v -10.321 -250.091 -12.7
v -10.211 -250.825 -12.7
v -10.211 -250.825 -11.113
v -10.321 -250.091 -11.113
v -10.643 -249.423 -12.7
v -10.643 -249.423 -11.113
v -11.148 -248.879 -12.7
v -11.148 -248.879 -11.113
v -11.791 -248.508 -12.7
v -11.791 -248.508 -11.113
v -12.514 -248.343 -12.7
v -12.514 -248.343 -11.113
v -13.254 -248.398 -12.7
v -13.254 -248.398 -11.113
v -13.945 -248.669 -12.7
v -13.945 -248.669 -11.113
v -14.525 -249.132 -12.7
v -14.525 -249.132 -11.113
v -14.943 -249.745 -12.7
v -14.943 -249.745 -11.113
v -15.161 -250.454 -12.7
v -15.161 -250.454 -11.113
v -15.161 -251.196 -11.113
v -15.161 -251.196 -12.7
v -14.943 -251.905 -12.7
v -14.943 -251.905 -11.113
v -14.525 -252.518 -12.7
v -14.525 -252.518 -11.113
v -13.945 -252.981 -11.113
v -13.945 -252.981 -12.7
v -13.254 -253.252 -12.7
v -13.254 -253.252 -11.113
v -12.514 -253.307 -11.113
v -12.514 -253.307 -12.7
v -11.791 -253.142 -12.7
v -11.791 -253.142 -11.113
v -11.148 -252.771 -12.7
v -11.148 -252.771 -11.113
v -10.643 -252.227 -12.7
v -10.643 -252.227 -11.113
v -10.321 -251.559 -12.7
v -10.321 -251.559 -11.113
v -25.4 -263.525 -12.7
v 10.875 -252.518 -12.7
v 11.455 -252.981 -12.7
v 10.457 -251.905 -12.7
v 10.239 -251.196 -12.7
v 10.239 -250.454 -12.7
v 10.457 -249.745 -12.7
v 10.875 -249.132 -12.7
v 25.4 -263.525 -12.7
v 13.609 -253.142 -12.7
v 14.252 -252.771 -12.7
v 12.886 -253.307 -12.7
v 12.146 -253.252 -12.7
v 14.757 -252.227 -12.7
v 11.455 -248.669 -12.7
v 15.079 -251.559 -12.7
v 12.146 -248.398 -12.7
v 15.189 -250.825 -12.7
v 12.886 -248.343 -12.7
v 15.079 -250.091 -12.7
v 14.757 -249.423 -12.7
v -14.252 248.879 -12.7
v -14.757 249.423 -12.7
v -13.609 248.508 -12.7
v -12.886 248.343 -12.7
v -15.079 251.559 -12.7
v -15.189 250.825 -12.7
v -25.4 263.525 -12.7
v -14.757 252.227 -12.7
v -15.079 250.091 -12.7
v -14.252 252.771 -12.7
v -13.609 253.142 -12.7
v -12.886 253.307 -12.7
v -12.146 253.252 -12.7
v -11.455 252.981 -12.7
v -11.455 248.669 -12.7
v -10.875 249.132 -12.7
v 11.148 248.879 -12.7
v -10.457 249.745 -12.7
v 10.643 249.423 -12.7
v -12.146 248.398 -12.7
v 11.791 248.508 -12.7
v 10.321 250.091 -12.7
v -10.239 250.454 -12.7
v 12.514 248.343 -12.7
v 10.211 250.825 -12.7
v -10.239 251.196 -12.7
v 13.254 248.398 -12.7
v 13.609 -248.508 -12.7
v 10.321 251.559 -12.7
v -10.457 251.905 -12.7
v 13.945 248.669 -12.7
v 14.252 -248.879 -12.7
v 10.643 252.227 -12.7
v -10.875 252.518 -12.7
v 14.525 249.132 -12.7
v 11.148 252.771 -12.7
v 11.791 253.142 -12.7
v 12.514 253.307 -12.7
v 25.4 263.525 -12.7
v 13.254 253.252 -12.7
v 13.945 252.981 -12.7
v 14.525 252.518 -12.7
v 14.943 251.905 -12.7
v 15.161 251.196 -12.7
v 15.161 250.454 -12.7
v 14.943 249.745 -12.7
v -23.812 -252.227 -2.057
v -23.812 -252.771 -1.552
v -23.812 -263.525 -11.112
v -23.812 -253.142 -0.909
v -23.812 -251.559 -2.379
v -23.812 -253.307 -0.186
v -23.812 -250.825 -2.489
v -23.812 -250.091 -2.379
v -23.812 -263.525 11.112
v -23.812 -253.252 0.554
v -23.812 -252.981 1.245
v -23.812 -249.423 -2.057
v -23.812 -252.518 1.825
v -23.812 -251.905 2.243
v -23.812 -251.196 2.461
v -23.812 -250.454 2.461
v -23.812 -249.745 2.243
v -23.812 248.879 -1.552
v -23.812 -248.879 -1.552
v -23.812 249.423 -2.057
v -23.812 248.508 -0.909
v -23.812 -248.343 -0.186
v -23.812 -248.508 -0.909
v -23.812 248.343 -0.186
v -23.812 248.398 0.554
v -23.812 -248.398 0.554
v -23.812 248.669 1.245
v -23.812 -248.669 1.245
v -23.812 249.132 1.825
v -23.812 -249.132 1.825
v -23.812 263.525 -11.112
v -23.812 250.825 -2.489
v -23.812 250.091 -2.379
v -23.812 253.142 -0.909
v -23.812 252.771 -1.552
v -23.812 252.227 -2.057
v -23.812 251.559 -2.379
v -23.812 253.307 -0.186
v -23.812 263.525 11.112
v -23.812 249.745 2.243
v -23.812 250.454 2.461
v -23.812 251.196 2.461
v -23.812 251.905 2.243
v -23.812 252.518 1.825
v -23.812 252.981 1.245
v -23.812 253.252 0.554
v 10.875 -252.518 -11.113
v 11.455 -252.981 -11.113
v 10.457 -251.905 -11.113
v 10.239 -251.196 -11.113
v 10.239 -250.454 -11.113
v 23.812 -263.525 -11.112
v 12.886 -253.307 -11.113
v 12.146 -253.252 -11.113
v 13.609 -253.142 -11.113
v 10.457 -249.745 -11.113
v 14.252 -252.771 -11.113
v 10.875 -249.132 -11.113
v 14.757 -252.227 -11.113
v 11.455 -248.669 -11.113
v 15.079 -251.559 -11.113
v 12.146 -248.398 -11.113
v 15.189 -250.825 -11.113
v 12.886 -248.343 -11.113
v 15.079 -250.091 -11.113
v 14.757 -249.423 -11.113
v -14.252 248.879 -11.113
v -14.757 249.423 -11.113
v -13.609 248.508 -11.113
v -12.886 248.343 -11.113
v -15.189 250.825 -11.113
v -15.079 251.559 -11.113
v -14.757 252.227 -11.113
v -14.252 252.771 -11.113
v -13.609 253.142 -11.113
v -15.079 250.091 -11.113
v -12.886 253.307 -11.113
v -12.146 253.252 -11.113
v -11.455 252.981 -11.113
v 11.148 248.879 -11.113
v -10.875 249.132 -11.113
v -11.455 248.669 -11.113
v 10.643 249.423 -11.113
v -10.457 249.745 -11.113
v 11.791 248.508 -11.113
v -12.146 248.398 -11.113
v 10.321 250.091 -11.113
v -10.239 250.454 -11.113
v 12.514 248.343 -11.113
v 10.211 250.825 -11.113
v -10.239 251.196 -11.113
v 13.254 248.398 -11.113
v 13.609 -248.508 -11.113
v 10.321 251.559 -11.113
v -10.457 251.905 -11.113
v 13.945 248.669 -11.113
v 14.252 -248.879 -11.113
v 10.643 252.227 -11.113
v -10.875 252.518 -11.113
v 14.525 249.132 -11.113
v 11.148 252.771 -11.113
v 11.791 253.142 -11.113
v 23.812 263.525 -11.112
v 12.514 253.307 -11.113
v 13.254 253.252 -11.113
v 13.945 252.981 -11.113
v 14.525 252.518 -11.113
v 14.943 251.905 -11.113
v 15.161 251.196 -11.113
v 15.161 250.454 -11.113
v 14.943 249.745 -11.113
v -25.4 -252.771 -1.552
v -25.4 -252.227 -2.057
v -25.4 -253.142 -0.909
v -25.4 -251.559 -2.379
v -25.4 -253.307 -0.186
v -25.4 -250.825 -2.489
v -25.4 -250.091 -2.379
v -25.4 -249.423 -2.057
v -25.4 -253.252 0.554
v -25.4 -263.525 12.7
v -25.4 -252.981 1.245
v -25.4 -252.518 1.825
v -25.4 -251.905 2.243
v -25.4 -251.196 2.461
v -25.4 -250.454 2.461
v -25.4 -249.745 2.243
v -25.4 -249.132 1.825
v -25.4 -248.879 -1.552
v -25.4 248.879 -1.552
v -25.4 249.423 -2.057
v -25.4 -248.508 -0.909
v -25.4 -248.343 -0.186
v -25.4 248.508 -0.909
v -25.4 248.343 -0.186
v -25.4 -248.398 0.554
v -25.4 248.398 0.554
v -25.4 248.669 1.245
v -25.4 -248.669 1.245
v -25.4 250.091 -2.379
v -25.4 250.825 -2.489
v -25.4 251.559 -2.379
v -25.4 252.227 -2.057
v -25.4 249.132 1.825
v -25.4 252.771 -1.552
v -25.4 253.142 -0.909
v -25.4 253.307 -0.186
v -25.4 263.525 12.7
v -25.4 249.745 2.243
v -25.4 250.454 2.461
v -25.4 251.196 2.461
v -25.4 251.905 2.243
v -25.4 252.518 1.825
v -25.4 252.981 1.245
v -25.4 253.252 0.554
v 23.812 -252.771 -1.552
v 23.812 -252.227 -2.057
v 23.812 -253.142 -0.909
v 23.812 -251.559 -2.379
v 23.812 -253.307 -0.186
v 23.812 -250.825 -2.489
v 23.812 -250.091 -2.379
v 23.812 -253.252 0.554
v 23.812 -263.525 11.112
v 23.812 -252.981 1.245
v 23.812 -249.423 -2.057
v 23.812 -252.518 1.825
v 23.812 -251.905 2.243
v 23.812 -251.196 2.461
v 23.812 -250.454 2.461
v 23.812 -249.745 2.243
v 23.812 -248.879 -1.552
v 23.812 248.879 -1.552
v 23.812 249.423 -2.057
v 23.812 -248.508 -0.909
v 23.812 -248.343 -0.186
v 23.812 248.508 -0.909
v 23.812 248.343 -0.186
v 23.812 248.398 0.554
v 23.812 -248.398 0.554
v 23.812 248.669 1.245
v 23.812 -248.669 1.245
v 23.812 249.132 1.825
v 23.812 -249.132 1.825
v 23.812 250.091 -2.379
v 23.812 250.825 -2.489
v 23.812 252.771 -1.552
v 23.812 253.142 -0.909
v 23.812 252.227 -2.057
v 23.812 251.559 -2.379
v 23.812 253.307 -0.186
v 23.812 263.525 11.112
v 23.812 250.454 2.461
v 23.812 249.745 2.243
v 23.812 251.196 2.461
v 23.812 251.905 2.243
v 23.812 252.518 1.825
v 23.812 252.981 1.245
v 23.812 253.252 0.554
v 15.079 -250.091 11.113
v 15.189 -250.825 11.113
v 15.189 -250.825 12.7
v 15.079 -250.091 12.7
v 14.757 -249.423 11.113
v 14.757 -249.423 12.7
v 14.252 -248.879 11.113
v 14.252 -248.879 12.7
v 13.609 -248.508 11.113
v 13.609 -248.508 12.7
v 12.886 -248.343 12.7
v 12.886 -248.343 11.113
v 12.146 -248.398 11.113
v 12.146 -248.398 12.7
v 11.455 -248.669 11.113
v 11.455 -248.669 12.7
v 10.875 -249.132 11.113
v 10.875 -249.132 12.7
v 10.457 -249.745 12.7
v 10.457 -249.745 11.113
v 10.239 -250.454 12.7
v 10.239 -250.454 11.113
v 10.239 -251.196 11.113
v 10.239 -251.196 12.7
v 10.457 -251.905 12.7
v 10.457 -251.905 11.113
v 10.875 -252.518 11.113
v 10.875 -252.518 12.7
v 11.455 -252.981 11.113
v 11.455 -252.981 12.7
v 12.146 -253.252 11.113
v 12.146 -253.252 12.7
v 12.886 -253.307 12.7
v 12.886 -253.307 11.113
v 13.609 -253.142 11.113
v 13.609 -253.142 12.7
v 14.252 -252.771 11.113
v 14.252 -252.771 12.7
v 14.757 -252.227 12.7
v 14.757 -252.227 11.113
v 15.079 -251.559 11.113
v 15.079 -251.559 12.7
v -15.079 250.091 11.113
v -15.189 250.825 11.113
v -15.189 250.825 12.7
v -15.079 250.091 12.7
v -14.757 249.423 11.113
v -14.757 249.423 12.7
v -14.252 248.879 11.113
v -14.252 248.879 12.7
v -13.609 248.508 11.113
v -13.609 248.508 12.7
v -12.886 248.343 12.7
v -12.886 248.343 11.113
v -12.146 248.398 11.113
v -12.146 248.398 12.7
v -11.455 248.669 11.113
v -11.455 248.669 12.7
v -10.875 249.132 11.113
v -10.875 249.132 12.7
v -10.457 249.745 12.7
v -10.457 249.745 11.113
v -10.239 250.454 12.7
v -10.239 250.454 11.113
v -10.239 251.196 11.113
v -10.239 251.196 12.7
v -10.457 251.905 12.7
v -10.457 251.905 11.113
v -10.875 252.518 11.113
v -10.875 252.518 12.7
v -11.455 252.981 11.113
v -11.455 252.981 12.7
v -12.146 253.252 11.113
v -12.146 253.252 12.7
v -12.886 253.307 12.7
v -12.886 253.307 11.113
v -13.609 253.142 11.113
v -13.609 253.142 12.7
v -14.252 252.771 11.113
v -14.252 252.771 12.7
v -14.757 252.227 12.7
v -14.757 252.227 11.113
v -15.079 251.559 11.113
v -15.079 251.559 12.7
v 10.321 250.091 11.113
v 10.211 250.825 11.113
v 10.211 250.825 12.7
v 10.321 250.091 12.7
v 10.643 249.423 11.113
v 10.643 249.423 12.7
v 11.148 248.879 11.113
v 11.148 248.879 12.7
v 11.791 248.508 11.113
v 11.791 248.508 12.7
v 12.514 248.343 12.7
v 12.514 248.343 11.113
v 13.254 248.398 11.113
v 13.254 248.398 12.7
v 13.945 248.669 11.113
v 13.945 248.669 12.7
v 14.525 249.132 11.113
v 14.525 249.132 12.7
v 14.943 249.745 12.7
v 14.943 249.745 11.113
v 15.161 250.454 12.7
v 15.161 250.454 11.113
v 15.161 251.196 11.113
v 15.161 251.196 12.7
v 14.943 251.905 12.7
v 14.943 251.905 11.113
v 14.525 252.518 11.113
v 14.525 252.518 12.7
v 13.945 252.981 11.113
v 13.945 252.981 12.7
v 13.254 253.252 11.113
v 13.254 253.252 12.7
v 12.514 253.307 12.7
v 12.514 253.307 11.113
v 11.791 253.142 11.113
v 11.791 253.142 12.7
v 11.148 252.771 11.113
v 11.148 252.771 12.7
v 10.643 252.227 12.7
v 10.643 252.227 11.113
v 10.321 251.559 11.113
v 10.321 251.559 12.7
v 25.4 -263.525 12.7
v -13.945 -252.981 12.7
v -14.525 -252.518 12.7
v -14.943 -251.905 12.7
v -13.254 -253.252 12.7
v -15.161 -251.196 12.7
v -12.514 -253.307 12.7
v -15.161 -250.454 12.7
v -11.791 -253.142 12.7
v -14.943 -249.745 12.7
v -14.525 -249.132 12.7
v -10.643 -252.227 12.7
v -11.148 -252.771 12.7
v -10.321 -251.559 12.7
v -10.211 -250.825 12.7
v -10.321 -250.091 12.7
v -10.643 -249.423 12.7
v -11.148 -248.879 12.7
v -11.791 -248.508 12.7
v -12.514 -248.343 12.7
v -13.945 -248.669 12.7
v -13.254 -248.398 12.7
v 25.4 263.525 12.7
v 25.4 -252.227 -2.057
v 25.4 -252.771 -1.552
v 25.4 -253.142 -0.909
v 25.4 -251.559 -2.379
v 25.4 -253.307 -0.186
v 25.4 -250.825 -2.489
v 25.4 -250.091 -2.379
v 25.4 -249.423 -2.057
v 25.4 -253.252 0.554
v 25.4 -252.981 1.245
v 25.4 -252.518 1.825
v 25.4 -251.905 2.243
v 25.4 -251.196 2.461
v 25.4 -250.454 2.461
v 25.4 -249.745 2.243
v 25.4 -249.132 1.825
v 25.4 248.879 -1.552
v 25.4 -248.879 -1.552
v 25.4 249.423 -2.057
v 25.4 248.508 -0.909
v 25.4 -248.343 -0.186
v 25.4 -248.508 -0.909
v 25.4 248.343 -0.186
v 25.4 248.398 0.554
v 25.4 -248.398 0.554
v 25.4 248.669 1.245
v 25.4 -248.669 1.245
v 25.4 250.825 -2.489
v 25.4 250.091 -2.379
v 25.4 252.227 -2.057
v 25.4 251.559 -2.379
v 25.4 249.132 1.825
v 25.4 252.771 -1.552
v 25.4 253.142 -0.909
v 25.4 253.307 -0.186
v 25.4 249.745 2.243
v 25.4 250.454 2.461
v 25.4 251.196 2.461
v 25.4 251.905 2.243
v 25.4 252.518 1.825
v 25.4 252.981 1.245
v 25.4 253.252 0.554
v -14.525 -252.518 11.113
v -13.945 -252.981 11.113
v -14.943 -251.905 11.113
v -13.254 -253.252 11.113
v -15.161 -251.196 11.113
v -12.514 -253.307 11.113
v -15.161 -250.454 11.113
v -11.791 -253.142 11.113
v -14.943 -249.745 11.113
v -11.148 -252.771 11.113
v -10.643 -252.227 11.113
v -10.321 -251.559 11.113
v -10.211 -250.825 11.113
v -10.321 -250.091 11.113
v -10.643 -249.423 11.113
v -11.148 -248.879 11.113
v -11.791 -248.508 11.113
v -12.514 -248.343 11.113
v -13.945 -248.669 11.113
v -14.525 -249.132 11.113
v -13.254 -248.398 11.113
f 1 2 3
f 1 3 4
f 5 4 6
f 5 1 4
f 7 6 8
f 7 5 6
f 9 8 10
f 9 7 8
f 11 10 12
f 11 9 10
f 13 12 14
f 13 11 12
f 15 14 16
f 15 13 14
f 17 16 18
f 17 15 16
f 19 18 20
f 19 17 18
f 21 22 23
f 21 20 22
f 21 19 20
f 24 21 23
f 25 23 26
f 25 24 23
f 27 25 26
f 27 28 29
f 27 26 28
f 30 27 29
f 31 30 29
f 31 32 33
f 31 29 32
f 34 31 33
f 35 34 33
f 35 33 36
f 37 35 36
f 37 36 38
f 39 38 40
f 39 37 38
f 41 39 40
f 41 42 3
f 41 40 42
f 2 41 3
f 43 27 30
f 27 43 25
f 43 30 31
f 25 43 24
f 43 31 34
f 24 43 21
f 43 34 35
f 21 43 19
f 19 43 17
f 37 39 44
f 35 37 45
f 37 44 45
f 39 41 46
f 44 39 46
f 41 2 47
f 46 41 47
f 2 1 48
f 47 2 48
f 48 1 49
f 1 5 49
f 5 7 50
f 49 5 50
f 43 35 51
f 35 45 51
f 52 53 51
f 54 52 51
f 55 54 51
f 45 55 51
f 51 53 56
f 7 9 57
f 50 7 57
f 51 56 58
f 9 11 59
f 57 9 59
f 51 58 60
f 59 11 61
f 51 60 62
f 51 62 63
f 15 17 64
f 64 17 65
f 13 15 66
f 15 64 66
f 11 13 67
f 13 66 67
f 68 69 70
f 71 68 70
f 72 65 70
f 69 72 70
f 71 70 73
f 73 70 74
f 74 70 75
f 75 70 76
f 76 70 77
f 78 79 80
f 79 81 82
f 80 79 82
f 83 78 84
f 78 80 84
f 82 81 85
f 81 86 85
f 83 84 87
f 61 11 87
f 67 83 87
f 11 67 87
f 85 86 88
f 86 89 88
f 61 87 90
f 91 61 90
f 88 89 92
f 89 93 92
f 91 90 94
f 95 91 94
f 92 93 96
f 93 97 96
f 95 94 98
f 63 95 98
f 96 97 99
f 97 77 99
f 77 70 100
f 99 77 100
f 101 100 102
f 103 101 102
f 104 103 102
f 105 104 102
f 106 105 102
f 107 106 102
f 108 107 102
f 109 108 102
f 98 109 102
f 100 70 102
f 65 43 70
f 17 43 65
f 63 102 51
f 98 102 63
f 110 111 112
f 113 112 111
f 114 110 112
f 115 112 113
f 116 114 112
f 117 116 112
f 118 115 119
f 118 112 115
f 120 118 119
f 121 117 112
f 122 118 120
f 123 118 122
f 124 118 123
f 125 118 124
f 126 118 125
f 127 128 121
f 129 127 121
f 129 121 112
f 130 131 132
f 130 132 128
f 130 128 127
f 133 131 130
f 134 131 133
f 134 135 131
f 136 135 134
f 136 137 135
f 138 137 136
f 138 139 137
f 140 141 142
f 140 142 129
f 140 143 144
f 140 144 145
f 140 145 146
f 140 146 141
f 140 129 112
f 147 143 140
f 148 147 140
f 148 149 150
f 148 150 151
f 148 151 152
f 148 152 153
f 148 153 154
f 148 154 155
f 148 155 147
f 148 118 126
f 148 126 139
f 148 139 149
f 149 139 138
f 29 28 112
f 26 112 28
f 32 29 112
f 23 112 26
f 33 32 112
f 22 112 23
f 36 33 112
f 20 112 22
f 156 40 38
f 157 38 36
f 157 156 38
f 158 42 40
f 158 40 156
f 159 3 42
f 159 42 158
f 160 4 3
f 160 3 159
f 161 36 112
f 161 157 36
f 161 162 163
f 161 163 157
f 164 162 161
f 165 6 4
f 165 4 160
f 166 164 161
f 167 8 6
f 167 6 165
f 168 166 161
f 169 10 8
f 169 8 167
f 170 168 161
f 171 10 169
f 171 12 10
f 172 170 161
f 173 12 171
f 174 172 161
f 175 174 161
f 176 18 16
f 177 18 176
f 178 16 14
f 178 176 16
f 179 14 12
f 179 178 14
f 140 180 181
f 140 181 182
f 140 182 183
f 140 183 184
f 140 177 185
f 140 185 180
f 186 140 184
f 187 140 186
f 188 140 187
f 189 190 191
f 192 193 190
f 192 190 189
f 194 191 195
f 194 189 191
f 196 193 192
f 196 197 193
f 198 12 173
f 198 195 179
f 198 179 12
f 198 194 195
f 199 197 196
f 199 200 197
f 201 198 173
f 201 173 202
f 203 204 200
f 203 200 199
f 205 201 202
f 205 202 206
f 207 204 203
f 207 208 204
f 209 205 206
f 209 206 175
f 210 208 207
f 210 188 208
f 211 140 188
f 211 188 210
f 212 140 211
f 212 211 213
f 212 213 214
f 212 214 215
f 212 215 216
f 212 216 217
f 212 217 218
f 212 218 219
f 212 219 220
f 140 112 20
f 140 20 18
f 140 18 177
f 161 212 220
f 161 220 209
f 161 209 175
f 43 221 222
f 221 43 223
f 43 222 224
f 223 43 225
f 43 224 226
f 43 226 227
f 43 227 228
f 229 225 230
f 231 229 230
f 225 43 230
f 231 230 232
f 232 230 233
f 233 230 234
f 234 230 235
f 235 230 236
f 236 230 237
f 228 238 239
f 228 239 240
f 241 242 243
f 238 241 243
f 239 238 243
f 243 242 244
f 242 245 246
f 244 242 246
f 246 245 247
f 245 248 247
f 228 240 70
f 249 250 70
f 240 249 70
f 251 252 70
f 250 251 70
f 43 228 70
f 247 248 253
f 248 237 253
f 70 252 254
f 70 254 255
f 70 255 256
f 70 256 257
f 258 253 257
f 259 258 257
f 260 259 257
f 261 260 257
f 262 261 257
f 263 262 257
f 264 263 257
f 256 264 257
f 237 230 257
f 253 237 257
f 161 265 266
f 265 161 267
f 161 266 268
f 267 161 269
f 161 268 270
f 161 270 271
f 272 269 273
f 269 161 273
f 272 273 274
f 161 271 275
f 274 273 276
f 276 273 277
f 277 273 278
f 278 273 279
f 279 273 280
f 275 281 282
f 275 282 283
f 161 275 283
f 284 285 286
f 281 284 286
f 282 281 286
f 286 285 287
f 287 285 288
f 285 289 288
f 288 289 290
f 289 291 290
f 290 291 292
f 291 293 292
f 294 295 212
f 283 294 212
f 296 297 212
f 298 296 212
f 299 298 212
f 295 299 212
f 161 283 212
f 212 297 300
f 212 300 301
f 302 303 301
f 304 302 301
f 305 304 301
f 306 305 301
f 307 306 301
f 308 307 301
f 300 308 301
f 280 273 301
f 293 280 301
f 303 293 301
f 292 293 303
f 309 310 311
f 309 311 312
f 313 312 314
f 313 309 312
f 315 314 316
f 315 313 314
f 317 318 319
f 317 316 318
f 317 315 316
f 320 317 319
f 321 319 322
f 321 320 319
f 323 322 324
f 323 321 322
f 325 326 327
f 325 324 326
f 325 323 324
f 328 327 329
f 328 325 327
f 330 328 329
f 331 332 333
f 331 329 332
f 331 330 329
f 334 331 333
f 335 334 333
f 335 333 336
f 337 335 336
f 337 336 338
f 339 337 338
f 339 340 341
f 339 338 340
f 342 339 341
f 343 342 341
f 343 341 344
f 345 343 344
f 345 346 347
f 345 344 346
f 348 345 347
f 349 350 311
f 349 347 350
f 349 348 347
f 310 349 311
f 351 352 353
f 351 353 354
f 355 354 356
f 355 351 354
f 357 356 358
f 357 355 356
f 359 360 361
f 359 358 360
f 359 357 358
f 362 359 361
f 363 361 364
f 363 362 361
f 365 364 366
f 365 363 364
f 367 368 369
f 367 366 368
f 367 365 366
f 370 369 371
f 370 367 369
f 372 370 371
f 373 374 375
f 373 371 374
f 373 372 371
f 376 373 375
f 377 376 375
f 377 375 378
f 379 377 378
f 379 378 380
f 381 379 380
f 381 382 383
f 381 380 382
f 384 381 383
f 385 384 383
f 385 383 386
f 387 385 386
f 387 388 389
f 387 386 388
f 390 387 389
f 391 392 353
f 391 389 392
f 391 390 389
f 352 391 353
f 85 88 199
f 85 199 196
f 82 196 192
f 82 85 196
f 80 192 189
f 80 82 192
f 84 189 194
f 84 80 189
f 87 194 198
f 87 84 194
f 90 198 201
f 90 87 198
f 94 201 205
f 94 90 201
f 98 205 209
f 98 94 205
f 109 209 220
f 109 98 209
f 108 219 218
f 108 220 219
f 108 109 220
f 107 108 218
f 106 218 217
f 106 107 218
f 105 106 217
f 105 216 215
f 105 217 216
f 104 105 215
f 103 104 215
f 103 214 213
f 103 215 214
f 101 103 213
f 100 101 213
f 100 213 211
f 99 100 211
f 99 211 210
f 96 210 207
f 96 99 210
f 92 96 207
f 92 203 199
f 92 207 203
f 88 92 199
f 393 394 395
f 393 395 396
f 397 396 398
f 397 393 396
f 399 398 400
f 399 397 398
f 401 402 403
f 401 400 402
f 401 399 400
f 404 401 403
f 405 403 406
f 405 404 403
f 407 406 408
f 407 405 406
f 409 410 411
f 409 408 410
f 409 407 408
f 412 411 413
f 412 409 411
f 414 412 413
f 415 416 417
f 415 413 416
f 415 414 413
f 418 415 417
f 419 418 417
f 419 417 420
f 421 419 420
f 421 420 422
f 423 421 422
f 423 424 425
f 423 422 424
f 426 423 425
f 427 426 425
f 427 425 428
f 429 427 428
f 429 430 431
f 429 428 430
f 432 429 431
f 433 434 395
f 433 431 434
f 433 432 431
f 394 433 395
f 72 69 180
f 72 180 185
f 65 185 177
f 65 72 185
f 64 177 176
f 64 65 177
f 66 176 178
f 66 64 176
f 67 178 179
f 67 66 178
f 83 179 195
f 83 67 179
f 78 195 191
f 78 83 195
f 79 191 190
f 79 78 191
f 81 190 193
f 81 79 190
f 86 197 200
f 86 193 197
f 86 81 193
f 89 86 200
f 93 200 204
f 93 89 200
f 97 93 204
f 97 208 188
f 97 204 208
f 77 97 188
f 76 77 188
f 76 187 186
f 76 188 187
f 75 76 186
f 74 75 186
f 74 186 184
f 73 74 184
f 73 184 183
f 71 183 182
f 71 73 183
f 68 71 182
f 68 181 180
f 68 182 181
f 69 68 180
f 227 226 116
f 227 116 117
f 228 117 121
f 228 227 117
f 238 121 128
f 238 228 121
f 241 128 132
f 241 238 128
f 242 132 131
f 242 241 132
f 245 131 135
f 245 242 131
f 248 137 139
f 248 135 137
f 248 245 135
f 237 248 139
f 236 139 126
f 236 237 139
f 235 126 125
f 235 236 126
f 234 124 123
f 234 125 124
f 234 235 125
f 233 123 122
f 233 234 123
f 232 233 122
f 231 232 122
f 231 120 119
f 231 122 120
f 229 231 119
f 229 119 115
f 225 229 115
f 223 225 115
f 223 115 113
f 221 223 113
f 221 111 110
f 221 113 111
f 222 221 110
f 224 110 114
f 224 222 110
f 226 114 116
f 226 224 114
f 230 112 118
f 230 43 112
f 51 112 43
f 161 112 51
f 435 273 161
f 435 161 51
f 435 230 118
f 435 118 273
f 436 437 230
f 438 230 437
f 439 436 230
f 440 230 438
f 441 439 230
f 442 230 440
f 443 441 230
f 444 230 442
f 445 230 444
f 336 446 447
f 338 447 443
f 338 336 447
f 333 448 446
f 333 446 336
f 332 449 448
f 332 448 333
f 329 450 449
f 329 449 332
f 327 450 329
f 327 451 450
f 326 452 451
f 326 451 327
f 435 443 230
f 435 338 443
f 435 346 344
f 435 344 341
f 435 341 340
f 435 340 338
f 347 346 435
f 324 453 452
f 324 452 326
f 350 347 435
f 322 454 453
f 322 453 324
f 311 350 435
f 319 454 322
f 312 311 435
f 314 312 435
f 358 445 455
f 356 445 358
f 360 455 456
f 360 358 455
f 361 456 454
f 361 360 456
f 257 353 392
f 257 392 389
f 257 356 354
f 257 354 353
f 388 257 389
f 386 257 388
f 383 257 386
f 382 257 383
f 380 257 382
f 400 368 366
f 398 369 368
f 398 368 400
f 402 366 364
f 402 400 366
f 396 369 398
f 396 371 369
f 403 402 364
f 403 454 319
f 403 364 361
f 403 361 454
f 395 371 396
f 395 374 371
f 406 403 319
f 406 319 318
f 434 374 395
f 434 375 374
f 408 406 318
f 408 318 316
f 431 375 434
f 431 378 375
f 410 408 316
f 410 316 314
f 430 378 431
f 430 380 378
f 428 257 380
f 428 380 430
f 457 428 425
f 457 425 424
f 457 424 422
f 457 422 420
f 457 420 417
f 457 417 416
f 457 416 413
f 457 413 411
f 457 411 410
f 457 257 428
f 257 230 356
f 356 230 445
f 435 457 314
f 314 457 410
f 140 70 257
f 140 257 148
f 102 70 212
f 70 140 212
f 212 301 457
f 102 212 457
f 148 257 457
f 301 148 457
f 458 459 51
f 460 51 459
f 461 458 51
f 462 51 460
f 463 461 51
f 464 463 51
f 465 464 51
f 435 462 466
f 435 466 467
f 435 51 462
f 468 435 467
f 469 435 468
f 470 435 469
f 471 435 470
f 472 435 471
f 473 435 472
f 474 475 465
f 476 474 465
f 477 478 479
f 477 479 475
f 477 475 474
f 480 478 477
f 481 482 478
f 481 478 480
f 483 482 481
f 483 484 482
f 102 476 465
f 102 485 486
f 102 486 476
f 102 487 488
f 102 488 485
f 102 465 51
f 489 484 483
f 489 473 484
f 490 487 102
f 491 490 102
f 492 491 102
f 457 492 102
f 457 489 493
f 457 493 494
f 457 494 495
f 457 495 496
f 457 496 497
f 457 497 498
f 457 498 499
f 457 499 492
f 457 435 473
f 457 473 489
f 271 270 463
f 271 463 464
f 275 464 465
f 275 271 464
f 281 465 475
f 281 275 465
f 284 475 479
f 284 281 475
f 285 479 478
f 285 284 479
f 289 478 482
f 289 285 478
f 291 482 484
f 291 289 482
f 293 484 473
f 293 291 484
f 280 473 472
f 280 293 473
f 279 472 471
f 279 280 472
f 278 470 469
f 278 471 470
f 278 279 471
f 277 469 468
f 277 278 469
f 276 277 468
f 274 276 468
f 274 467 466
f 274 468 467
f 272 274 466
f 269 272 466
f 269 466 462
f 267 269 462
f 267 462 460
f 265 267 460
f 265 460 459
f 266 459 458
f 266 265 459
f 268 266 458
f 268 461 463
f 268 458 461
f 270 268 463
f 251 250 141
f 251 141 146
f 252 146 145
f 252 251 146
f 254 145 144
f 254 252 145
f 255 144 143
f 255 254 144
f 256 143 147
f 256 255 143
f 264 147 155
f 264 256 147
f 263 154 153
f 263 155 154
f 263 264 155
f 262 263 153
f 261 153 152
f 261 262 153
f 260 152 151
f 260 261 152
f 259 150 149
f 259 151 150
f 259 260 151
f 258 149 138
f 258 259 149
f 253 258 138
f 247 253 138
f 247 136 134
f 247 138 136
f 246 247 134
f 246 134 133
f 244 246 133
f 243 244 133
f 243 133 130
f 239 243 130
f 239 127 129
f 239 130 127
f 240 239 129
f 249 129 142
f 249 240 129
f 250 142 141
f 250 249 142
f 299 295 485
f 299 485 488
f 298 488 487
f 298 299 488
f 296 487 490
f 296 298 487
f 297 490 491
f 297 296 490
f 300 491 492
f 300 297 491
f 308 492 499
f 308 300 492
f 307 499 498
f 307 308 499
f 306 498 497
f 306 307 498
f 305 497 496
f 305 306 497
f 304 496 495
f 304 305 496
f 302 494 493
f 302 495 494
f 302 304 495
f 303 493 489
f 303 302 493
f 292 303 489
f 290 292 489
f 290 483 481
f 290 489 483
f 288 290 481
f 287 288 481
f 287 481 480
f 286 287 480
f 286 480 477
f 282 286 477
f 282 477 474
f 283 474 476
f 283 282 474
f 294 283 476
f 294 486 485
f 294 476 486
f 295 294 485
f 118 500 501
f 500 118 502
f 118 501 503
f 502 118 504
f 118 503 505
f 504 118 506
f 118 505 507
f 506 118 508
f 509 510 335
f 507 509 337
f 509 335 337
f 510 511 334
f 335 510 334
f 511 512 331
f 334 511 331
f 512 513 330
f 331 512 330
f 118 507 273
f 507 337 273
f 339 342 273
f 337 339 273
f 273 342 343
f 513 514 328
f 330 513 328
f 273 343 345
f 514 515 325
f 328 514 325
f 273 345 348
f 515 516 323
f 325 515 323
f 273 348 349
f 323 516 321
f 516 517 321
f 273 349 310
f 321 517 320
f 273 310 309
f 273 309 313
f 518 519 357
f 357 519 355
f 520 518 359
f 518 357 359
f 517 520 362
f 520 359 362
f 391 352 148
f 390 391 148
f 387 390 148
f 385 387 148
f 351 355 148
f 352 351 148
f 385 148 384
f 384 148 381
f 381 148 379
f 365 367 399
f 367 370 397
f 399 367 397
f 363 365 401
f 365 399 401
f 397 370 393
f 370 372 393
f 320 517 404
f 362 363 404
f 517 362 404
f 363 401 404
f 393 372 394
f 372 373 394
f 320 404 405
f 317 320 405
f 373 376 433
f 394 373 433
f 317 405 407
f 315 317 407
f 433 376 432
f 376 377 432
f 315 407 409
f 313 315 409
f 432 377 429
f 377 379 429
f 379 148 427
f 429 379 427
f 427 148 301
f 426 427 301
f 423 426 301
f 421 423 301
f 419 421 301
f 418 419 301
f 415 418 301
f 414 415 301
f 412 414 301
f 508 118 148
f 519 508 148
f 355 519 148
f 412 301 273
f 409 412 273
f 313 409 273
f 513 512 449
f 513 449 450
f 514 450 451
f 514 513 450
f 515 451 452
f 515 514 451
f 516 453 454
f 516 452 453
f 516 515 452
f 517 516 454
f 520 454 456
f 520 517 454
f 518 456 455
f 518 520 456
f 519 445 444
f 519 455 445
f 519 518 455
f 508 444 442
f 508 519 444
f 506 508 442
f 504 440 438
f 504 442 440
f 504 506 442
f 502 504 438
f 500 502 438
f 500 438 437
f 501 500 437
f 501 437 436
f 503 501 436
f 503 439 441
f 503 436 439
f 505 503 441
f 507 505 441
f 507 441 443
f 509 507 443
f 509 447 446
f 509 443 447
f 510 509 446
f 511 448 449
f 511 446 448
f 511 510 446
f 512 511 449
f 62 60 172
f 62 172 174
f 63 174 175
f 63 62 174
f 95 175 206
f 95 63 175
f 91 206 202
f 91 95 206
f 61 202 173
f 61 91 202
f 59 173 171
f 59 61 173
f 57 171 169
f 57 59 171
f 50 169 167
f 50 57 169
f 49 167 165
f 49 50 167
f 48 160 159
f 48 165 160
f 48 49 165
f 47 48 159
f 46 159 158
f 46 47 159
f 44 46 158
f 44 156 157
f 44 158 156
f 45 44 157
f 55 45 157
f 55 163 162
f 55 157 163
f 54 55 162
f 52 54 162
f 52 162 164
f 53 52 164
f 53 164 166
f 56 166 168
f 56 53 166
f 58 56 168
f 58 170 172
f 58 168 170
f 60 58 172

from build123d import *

# Parameters (mm, degrees)
SKETCH1_W               = 50.8
SKETCH1_H               = 527.05
BOSS_EXTRUDE1_DEPTH     = 12.7
SHELL1_T                = -1.5875
CUT_EXTRUDE1_DEPTH      = 266.050703876
CUT_EXTRUDE1_DEPTH_BACK = 266.050703876
SKETCH2_R               = 2.4892
CUT_EXTRUDE2_DEPTH      = 266.050703876
CUT_EXTRUDE2_DEPTH_BACK = 266.050703876
SKETCH3_R               = 2.4892


with BuildPart() as part:
    # Sketch1 → Boss-Extrude1 (new, symmetric)
    with BuildSketch(Plane.XY):
        Rectangle(SKETCH1_W, SKETCH1_H)
    extrude(amount=BOSS_EXTRUDE1_DEPTH, both=True)

    # Shell1
    shell1_openings = [part.faces().sort_by_distance(p)[0] for p in [
        (0, -263.525, 0),
        (0, 263.525, 0),
    ]]
    offset(amount=SHELL1_T, openings=shell1_openings, kind=Kind.INTERSECTION)

    # Sketch2 → Cut-Extrude1 (cut, two sides: drawn at the far end of the back side and taken through both)
    with BuildSketch(Plane.XY.offset(-CUT_EXTRUDE1_DEPTH_BACK)):
        with Locations((-12.7, -250.825)):
            Circle(SKETCH2_R)
        with Locations((12.7, -250.825)):
            Circle(SKETCH2_R)
        with Locations(Location((12.7, 250.825, 0), (0, 0, 180))):
            Circle(SKETCH2_R)
        with Locations(Location((-12.7, 250.825, 0), (0, 0, 180))):
            Circle(SKETCH2_R)
    extrude(amount=CUT_EXTRUDE1_DEPTH + CUT_EXTRUDE1_DEPTH_BACK, mode=Mode.SUBTRACT)

    # Sketch3 → Cut-Extrude2 (cut, two sides: drawn at the far end of the back side and taken through both)
    with BuildSketch(Plane(origin=(0, 0, 0), x_dir=(0, 0, -1), z_dir=(1, 0, 0)).offset(-CUT_EXTRUDE2_DEPTH_BACK)):
        with Locations((0, -250.825)):
            Circle(SKETCH3_R)
        with Locations((0, 250.825)):
            Circle(SKETCH3_R)
    extrude(amount=CUT_EXTRUDE2_DEPTH + CUT_EXTRUDE2_DEPTH_BACK, mode=Mode.SUBTRACT)


solid = part.part
